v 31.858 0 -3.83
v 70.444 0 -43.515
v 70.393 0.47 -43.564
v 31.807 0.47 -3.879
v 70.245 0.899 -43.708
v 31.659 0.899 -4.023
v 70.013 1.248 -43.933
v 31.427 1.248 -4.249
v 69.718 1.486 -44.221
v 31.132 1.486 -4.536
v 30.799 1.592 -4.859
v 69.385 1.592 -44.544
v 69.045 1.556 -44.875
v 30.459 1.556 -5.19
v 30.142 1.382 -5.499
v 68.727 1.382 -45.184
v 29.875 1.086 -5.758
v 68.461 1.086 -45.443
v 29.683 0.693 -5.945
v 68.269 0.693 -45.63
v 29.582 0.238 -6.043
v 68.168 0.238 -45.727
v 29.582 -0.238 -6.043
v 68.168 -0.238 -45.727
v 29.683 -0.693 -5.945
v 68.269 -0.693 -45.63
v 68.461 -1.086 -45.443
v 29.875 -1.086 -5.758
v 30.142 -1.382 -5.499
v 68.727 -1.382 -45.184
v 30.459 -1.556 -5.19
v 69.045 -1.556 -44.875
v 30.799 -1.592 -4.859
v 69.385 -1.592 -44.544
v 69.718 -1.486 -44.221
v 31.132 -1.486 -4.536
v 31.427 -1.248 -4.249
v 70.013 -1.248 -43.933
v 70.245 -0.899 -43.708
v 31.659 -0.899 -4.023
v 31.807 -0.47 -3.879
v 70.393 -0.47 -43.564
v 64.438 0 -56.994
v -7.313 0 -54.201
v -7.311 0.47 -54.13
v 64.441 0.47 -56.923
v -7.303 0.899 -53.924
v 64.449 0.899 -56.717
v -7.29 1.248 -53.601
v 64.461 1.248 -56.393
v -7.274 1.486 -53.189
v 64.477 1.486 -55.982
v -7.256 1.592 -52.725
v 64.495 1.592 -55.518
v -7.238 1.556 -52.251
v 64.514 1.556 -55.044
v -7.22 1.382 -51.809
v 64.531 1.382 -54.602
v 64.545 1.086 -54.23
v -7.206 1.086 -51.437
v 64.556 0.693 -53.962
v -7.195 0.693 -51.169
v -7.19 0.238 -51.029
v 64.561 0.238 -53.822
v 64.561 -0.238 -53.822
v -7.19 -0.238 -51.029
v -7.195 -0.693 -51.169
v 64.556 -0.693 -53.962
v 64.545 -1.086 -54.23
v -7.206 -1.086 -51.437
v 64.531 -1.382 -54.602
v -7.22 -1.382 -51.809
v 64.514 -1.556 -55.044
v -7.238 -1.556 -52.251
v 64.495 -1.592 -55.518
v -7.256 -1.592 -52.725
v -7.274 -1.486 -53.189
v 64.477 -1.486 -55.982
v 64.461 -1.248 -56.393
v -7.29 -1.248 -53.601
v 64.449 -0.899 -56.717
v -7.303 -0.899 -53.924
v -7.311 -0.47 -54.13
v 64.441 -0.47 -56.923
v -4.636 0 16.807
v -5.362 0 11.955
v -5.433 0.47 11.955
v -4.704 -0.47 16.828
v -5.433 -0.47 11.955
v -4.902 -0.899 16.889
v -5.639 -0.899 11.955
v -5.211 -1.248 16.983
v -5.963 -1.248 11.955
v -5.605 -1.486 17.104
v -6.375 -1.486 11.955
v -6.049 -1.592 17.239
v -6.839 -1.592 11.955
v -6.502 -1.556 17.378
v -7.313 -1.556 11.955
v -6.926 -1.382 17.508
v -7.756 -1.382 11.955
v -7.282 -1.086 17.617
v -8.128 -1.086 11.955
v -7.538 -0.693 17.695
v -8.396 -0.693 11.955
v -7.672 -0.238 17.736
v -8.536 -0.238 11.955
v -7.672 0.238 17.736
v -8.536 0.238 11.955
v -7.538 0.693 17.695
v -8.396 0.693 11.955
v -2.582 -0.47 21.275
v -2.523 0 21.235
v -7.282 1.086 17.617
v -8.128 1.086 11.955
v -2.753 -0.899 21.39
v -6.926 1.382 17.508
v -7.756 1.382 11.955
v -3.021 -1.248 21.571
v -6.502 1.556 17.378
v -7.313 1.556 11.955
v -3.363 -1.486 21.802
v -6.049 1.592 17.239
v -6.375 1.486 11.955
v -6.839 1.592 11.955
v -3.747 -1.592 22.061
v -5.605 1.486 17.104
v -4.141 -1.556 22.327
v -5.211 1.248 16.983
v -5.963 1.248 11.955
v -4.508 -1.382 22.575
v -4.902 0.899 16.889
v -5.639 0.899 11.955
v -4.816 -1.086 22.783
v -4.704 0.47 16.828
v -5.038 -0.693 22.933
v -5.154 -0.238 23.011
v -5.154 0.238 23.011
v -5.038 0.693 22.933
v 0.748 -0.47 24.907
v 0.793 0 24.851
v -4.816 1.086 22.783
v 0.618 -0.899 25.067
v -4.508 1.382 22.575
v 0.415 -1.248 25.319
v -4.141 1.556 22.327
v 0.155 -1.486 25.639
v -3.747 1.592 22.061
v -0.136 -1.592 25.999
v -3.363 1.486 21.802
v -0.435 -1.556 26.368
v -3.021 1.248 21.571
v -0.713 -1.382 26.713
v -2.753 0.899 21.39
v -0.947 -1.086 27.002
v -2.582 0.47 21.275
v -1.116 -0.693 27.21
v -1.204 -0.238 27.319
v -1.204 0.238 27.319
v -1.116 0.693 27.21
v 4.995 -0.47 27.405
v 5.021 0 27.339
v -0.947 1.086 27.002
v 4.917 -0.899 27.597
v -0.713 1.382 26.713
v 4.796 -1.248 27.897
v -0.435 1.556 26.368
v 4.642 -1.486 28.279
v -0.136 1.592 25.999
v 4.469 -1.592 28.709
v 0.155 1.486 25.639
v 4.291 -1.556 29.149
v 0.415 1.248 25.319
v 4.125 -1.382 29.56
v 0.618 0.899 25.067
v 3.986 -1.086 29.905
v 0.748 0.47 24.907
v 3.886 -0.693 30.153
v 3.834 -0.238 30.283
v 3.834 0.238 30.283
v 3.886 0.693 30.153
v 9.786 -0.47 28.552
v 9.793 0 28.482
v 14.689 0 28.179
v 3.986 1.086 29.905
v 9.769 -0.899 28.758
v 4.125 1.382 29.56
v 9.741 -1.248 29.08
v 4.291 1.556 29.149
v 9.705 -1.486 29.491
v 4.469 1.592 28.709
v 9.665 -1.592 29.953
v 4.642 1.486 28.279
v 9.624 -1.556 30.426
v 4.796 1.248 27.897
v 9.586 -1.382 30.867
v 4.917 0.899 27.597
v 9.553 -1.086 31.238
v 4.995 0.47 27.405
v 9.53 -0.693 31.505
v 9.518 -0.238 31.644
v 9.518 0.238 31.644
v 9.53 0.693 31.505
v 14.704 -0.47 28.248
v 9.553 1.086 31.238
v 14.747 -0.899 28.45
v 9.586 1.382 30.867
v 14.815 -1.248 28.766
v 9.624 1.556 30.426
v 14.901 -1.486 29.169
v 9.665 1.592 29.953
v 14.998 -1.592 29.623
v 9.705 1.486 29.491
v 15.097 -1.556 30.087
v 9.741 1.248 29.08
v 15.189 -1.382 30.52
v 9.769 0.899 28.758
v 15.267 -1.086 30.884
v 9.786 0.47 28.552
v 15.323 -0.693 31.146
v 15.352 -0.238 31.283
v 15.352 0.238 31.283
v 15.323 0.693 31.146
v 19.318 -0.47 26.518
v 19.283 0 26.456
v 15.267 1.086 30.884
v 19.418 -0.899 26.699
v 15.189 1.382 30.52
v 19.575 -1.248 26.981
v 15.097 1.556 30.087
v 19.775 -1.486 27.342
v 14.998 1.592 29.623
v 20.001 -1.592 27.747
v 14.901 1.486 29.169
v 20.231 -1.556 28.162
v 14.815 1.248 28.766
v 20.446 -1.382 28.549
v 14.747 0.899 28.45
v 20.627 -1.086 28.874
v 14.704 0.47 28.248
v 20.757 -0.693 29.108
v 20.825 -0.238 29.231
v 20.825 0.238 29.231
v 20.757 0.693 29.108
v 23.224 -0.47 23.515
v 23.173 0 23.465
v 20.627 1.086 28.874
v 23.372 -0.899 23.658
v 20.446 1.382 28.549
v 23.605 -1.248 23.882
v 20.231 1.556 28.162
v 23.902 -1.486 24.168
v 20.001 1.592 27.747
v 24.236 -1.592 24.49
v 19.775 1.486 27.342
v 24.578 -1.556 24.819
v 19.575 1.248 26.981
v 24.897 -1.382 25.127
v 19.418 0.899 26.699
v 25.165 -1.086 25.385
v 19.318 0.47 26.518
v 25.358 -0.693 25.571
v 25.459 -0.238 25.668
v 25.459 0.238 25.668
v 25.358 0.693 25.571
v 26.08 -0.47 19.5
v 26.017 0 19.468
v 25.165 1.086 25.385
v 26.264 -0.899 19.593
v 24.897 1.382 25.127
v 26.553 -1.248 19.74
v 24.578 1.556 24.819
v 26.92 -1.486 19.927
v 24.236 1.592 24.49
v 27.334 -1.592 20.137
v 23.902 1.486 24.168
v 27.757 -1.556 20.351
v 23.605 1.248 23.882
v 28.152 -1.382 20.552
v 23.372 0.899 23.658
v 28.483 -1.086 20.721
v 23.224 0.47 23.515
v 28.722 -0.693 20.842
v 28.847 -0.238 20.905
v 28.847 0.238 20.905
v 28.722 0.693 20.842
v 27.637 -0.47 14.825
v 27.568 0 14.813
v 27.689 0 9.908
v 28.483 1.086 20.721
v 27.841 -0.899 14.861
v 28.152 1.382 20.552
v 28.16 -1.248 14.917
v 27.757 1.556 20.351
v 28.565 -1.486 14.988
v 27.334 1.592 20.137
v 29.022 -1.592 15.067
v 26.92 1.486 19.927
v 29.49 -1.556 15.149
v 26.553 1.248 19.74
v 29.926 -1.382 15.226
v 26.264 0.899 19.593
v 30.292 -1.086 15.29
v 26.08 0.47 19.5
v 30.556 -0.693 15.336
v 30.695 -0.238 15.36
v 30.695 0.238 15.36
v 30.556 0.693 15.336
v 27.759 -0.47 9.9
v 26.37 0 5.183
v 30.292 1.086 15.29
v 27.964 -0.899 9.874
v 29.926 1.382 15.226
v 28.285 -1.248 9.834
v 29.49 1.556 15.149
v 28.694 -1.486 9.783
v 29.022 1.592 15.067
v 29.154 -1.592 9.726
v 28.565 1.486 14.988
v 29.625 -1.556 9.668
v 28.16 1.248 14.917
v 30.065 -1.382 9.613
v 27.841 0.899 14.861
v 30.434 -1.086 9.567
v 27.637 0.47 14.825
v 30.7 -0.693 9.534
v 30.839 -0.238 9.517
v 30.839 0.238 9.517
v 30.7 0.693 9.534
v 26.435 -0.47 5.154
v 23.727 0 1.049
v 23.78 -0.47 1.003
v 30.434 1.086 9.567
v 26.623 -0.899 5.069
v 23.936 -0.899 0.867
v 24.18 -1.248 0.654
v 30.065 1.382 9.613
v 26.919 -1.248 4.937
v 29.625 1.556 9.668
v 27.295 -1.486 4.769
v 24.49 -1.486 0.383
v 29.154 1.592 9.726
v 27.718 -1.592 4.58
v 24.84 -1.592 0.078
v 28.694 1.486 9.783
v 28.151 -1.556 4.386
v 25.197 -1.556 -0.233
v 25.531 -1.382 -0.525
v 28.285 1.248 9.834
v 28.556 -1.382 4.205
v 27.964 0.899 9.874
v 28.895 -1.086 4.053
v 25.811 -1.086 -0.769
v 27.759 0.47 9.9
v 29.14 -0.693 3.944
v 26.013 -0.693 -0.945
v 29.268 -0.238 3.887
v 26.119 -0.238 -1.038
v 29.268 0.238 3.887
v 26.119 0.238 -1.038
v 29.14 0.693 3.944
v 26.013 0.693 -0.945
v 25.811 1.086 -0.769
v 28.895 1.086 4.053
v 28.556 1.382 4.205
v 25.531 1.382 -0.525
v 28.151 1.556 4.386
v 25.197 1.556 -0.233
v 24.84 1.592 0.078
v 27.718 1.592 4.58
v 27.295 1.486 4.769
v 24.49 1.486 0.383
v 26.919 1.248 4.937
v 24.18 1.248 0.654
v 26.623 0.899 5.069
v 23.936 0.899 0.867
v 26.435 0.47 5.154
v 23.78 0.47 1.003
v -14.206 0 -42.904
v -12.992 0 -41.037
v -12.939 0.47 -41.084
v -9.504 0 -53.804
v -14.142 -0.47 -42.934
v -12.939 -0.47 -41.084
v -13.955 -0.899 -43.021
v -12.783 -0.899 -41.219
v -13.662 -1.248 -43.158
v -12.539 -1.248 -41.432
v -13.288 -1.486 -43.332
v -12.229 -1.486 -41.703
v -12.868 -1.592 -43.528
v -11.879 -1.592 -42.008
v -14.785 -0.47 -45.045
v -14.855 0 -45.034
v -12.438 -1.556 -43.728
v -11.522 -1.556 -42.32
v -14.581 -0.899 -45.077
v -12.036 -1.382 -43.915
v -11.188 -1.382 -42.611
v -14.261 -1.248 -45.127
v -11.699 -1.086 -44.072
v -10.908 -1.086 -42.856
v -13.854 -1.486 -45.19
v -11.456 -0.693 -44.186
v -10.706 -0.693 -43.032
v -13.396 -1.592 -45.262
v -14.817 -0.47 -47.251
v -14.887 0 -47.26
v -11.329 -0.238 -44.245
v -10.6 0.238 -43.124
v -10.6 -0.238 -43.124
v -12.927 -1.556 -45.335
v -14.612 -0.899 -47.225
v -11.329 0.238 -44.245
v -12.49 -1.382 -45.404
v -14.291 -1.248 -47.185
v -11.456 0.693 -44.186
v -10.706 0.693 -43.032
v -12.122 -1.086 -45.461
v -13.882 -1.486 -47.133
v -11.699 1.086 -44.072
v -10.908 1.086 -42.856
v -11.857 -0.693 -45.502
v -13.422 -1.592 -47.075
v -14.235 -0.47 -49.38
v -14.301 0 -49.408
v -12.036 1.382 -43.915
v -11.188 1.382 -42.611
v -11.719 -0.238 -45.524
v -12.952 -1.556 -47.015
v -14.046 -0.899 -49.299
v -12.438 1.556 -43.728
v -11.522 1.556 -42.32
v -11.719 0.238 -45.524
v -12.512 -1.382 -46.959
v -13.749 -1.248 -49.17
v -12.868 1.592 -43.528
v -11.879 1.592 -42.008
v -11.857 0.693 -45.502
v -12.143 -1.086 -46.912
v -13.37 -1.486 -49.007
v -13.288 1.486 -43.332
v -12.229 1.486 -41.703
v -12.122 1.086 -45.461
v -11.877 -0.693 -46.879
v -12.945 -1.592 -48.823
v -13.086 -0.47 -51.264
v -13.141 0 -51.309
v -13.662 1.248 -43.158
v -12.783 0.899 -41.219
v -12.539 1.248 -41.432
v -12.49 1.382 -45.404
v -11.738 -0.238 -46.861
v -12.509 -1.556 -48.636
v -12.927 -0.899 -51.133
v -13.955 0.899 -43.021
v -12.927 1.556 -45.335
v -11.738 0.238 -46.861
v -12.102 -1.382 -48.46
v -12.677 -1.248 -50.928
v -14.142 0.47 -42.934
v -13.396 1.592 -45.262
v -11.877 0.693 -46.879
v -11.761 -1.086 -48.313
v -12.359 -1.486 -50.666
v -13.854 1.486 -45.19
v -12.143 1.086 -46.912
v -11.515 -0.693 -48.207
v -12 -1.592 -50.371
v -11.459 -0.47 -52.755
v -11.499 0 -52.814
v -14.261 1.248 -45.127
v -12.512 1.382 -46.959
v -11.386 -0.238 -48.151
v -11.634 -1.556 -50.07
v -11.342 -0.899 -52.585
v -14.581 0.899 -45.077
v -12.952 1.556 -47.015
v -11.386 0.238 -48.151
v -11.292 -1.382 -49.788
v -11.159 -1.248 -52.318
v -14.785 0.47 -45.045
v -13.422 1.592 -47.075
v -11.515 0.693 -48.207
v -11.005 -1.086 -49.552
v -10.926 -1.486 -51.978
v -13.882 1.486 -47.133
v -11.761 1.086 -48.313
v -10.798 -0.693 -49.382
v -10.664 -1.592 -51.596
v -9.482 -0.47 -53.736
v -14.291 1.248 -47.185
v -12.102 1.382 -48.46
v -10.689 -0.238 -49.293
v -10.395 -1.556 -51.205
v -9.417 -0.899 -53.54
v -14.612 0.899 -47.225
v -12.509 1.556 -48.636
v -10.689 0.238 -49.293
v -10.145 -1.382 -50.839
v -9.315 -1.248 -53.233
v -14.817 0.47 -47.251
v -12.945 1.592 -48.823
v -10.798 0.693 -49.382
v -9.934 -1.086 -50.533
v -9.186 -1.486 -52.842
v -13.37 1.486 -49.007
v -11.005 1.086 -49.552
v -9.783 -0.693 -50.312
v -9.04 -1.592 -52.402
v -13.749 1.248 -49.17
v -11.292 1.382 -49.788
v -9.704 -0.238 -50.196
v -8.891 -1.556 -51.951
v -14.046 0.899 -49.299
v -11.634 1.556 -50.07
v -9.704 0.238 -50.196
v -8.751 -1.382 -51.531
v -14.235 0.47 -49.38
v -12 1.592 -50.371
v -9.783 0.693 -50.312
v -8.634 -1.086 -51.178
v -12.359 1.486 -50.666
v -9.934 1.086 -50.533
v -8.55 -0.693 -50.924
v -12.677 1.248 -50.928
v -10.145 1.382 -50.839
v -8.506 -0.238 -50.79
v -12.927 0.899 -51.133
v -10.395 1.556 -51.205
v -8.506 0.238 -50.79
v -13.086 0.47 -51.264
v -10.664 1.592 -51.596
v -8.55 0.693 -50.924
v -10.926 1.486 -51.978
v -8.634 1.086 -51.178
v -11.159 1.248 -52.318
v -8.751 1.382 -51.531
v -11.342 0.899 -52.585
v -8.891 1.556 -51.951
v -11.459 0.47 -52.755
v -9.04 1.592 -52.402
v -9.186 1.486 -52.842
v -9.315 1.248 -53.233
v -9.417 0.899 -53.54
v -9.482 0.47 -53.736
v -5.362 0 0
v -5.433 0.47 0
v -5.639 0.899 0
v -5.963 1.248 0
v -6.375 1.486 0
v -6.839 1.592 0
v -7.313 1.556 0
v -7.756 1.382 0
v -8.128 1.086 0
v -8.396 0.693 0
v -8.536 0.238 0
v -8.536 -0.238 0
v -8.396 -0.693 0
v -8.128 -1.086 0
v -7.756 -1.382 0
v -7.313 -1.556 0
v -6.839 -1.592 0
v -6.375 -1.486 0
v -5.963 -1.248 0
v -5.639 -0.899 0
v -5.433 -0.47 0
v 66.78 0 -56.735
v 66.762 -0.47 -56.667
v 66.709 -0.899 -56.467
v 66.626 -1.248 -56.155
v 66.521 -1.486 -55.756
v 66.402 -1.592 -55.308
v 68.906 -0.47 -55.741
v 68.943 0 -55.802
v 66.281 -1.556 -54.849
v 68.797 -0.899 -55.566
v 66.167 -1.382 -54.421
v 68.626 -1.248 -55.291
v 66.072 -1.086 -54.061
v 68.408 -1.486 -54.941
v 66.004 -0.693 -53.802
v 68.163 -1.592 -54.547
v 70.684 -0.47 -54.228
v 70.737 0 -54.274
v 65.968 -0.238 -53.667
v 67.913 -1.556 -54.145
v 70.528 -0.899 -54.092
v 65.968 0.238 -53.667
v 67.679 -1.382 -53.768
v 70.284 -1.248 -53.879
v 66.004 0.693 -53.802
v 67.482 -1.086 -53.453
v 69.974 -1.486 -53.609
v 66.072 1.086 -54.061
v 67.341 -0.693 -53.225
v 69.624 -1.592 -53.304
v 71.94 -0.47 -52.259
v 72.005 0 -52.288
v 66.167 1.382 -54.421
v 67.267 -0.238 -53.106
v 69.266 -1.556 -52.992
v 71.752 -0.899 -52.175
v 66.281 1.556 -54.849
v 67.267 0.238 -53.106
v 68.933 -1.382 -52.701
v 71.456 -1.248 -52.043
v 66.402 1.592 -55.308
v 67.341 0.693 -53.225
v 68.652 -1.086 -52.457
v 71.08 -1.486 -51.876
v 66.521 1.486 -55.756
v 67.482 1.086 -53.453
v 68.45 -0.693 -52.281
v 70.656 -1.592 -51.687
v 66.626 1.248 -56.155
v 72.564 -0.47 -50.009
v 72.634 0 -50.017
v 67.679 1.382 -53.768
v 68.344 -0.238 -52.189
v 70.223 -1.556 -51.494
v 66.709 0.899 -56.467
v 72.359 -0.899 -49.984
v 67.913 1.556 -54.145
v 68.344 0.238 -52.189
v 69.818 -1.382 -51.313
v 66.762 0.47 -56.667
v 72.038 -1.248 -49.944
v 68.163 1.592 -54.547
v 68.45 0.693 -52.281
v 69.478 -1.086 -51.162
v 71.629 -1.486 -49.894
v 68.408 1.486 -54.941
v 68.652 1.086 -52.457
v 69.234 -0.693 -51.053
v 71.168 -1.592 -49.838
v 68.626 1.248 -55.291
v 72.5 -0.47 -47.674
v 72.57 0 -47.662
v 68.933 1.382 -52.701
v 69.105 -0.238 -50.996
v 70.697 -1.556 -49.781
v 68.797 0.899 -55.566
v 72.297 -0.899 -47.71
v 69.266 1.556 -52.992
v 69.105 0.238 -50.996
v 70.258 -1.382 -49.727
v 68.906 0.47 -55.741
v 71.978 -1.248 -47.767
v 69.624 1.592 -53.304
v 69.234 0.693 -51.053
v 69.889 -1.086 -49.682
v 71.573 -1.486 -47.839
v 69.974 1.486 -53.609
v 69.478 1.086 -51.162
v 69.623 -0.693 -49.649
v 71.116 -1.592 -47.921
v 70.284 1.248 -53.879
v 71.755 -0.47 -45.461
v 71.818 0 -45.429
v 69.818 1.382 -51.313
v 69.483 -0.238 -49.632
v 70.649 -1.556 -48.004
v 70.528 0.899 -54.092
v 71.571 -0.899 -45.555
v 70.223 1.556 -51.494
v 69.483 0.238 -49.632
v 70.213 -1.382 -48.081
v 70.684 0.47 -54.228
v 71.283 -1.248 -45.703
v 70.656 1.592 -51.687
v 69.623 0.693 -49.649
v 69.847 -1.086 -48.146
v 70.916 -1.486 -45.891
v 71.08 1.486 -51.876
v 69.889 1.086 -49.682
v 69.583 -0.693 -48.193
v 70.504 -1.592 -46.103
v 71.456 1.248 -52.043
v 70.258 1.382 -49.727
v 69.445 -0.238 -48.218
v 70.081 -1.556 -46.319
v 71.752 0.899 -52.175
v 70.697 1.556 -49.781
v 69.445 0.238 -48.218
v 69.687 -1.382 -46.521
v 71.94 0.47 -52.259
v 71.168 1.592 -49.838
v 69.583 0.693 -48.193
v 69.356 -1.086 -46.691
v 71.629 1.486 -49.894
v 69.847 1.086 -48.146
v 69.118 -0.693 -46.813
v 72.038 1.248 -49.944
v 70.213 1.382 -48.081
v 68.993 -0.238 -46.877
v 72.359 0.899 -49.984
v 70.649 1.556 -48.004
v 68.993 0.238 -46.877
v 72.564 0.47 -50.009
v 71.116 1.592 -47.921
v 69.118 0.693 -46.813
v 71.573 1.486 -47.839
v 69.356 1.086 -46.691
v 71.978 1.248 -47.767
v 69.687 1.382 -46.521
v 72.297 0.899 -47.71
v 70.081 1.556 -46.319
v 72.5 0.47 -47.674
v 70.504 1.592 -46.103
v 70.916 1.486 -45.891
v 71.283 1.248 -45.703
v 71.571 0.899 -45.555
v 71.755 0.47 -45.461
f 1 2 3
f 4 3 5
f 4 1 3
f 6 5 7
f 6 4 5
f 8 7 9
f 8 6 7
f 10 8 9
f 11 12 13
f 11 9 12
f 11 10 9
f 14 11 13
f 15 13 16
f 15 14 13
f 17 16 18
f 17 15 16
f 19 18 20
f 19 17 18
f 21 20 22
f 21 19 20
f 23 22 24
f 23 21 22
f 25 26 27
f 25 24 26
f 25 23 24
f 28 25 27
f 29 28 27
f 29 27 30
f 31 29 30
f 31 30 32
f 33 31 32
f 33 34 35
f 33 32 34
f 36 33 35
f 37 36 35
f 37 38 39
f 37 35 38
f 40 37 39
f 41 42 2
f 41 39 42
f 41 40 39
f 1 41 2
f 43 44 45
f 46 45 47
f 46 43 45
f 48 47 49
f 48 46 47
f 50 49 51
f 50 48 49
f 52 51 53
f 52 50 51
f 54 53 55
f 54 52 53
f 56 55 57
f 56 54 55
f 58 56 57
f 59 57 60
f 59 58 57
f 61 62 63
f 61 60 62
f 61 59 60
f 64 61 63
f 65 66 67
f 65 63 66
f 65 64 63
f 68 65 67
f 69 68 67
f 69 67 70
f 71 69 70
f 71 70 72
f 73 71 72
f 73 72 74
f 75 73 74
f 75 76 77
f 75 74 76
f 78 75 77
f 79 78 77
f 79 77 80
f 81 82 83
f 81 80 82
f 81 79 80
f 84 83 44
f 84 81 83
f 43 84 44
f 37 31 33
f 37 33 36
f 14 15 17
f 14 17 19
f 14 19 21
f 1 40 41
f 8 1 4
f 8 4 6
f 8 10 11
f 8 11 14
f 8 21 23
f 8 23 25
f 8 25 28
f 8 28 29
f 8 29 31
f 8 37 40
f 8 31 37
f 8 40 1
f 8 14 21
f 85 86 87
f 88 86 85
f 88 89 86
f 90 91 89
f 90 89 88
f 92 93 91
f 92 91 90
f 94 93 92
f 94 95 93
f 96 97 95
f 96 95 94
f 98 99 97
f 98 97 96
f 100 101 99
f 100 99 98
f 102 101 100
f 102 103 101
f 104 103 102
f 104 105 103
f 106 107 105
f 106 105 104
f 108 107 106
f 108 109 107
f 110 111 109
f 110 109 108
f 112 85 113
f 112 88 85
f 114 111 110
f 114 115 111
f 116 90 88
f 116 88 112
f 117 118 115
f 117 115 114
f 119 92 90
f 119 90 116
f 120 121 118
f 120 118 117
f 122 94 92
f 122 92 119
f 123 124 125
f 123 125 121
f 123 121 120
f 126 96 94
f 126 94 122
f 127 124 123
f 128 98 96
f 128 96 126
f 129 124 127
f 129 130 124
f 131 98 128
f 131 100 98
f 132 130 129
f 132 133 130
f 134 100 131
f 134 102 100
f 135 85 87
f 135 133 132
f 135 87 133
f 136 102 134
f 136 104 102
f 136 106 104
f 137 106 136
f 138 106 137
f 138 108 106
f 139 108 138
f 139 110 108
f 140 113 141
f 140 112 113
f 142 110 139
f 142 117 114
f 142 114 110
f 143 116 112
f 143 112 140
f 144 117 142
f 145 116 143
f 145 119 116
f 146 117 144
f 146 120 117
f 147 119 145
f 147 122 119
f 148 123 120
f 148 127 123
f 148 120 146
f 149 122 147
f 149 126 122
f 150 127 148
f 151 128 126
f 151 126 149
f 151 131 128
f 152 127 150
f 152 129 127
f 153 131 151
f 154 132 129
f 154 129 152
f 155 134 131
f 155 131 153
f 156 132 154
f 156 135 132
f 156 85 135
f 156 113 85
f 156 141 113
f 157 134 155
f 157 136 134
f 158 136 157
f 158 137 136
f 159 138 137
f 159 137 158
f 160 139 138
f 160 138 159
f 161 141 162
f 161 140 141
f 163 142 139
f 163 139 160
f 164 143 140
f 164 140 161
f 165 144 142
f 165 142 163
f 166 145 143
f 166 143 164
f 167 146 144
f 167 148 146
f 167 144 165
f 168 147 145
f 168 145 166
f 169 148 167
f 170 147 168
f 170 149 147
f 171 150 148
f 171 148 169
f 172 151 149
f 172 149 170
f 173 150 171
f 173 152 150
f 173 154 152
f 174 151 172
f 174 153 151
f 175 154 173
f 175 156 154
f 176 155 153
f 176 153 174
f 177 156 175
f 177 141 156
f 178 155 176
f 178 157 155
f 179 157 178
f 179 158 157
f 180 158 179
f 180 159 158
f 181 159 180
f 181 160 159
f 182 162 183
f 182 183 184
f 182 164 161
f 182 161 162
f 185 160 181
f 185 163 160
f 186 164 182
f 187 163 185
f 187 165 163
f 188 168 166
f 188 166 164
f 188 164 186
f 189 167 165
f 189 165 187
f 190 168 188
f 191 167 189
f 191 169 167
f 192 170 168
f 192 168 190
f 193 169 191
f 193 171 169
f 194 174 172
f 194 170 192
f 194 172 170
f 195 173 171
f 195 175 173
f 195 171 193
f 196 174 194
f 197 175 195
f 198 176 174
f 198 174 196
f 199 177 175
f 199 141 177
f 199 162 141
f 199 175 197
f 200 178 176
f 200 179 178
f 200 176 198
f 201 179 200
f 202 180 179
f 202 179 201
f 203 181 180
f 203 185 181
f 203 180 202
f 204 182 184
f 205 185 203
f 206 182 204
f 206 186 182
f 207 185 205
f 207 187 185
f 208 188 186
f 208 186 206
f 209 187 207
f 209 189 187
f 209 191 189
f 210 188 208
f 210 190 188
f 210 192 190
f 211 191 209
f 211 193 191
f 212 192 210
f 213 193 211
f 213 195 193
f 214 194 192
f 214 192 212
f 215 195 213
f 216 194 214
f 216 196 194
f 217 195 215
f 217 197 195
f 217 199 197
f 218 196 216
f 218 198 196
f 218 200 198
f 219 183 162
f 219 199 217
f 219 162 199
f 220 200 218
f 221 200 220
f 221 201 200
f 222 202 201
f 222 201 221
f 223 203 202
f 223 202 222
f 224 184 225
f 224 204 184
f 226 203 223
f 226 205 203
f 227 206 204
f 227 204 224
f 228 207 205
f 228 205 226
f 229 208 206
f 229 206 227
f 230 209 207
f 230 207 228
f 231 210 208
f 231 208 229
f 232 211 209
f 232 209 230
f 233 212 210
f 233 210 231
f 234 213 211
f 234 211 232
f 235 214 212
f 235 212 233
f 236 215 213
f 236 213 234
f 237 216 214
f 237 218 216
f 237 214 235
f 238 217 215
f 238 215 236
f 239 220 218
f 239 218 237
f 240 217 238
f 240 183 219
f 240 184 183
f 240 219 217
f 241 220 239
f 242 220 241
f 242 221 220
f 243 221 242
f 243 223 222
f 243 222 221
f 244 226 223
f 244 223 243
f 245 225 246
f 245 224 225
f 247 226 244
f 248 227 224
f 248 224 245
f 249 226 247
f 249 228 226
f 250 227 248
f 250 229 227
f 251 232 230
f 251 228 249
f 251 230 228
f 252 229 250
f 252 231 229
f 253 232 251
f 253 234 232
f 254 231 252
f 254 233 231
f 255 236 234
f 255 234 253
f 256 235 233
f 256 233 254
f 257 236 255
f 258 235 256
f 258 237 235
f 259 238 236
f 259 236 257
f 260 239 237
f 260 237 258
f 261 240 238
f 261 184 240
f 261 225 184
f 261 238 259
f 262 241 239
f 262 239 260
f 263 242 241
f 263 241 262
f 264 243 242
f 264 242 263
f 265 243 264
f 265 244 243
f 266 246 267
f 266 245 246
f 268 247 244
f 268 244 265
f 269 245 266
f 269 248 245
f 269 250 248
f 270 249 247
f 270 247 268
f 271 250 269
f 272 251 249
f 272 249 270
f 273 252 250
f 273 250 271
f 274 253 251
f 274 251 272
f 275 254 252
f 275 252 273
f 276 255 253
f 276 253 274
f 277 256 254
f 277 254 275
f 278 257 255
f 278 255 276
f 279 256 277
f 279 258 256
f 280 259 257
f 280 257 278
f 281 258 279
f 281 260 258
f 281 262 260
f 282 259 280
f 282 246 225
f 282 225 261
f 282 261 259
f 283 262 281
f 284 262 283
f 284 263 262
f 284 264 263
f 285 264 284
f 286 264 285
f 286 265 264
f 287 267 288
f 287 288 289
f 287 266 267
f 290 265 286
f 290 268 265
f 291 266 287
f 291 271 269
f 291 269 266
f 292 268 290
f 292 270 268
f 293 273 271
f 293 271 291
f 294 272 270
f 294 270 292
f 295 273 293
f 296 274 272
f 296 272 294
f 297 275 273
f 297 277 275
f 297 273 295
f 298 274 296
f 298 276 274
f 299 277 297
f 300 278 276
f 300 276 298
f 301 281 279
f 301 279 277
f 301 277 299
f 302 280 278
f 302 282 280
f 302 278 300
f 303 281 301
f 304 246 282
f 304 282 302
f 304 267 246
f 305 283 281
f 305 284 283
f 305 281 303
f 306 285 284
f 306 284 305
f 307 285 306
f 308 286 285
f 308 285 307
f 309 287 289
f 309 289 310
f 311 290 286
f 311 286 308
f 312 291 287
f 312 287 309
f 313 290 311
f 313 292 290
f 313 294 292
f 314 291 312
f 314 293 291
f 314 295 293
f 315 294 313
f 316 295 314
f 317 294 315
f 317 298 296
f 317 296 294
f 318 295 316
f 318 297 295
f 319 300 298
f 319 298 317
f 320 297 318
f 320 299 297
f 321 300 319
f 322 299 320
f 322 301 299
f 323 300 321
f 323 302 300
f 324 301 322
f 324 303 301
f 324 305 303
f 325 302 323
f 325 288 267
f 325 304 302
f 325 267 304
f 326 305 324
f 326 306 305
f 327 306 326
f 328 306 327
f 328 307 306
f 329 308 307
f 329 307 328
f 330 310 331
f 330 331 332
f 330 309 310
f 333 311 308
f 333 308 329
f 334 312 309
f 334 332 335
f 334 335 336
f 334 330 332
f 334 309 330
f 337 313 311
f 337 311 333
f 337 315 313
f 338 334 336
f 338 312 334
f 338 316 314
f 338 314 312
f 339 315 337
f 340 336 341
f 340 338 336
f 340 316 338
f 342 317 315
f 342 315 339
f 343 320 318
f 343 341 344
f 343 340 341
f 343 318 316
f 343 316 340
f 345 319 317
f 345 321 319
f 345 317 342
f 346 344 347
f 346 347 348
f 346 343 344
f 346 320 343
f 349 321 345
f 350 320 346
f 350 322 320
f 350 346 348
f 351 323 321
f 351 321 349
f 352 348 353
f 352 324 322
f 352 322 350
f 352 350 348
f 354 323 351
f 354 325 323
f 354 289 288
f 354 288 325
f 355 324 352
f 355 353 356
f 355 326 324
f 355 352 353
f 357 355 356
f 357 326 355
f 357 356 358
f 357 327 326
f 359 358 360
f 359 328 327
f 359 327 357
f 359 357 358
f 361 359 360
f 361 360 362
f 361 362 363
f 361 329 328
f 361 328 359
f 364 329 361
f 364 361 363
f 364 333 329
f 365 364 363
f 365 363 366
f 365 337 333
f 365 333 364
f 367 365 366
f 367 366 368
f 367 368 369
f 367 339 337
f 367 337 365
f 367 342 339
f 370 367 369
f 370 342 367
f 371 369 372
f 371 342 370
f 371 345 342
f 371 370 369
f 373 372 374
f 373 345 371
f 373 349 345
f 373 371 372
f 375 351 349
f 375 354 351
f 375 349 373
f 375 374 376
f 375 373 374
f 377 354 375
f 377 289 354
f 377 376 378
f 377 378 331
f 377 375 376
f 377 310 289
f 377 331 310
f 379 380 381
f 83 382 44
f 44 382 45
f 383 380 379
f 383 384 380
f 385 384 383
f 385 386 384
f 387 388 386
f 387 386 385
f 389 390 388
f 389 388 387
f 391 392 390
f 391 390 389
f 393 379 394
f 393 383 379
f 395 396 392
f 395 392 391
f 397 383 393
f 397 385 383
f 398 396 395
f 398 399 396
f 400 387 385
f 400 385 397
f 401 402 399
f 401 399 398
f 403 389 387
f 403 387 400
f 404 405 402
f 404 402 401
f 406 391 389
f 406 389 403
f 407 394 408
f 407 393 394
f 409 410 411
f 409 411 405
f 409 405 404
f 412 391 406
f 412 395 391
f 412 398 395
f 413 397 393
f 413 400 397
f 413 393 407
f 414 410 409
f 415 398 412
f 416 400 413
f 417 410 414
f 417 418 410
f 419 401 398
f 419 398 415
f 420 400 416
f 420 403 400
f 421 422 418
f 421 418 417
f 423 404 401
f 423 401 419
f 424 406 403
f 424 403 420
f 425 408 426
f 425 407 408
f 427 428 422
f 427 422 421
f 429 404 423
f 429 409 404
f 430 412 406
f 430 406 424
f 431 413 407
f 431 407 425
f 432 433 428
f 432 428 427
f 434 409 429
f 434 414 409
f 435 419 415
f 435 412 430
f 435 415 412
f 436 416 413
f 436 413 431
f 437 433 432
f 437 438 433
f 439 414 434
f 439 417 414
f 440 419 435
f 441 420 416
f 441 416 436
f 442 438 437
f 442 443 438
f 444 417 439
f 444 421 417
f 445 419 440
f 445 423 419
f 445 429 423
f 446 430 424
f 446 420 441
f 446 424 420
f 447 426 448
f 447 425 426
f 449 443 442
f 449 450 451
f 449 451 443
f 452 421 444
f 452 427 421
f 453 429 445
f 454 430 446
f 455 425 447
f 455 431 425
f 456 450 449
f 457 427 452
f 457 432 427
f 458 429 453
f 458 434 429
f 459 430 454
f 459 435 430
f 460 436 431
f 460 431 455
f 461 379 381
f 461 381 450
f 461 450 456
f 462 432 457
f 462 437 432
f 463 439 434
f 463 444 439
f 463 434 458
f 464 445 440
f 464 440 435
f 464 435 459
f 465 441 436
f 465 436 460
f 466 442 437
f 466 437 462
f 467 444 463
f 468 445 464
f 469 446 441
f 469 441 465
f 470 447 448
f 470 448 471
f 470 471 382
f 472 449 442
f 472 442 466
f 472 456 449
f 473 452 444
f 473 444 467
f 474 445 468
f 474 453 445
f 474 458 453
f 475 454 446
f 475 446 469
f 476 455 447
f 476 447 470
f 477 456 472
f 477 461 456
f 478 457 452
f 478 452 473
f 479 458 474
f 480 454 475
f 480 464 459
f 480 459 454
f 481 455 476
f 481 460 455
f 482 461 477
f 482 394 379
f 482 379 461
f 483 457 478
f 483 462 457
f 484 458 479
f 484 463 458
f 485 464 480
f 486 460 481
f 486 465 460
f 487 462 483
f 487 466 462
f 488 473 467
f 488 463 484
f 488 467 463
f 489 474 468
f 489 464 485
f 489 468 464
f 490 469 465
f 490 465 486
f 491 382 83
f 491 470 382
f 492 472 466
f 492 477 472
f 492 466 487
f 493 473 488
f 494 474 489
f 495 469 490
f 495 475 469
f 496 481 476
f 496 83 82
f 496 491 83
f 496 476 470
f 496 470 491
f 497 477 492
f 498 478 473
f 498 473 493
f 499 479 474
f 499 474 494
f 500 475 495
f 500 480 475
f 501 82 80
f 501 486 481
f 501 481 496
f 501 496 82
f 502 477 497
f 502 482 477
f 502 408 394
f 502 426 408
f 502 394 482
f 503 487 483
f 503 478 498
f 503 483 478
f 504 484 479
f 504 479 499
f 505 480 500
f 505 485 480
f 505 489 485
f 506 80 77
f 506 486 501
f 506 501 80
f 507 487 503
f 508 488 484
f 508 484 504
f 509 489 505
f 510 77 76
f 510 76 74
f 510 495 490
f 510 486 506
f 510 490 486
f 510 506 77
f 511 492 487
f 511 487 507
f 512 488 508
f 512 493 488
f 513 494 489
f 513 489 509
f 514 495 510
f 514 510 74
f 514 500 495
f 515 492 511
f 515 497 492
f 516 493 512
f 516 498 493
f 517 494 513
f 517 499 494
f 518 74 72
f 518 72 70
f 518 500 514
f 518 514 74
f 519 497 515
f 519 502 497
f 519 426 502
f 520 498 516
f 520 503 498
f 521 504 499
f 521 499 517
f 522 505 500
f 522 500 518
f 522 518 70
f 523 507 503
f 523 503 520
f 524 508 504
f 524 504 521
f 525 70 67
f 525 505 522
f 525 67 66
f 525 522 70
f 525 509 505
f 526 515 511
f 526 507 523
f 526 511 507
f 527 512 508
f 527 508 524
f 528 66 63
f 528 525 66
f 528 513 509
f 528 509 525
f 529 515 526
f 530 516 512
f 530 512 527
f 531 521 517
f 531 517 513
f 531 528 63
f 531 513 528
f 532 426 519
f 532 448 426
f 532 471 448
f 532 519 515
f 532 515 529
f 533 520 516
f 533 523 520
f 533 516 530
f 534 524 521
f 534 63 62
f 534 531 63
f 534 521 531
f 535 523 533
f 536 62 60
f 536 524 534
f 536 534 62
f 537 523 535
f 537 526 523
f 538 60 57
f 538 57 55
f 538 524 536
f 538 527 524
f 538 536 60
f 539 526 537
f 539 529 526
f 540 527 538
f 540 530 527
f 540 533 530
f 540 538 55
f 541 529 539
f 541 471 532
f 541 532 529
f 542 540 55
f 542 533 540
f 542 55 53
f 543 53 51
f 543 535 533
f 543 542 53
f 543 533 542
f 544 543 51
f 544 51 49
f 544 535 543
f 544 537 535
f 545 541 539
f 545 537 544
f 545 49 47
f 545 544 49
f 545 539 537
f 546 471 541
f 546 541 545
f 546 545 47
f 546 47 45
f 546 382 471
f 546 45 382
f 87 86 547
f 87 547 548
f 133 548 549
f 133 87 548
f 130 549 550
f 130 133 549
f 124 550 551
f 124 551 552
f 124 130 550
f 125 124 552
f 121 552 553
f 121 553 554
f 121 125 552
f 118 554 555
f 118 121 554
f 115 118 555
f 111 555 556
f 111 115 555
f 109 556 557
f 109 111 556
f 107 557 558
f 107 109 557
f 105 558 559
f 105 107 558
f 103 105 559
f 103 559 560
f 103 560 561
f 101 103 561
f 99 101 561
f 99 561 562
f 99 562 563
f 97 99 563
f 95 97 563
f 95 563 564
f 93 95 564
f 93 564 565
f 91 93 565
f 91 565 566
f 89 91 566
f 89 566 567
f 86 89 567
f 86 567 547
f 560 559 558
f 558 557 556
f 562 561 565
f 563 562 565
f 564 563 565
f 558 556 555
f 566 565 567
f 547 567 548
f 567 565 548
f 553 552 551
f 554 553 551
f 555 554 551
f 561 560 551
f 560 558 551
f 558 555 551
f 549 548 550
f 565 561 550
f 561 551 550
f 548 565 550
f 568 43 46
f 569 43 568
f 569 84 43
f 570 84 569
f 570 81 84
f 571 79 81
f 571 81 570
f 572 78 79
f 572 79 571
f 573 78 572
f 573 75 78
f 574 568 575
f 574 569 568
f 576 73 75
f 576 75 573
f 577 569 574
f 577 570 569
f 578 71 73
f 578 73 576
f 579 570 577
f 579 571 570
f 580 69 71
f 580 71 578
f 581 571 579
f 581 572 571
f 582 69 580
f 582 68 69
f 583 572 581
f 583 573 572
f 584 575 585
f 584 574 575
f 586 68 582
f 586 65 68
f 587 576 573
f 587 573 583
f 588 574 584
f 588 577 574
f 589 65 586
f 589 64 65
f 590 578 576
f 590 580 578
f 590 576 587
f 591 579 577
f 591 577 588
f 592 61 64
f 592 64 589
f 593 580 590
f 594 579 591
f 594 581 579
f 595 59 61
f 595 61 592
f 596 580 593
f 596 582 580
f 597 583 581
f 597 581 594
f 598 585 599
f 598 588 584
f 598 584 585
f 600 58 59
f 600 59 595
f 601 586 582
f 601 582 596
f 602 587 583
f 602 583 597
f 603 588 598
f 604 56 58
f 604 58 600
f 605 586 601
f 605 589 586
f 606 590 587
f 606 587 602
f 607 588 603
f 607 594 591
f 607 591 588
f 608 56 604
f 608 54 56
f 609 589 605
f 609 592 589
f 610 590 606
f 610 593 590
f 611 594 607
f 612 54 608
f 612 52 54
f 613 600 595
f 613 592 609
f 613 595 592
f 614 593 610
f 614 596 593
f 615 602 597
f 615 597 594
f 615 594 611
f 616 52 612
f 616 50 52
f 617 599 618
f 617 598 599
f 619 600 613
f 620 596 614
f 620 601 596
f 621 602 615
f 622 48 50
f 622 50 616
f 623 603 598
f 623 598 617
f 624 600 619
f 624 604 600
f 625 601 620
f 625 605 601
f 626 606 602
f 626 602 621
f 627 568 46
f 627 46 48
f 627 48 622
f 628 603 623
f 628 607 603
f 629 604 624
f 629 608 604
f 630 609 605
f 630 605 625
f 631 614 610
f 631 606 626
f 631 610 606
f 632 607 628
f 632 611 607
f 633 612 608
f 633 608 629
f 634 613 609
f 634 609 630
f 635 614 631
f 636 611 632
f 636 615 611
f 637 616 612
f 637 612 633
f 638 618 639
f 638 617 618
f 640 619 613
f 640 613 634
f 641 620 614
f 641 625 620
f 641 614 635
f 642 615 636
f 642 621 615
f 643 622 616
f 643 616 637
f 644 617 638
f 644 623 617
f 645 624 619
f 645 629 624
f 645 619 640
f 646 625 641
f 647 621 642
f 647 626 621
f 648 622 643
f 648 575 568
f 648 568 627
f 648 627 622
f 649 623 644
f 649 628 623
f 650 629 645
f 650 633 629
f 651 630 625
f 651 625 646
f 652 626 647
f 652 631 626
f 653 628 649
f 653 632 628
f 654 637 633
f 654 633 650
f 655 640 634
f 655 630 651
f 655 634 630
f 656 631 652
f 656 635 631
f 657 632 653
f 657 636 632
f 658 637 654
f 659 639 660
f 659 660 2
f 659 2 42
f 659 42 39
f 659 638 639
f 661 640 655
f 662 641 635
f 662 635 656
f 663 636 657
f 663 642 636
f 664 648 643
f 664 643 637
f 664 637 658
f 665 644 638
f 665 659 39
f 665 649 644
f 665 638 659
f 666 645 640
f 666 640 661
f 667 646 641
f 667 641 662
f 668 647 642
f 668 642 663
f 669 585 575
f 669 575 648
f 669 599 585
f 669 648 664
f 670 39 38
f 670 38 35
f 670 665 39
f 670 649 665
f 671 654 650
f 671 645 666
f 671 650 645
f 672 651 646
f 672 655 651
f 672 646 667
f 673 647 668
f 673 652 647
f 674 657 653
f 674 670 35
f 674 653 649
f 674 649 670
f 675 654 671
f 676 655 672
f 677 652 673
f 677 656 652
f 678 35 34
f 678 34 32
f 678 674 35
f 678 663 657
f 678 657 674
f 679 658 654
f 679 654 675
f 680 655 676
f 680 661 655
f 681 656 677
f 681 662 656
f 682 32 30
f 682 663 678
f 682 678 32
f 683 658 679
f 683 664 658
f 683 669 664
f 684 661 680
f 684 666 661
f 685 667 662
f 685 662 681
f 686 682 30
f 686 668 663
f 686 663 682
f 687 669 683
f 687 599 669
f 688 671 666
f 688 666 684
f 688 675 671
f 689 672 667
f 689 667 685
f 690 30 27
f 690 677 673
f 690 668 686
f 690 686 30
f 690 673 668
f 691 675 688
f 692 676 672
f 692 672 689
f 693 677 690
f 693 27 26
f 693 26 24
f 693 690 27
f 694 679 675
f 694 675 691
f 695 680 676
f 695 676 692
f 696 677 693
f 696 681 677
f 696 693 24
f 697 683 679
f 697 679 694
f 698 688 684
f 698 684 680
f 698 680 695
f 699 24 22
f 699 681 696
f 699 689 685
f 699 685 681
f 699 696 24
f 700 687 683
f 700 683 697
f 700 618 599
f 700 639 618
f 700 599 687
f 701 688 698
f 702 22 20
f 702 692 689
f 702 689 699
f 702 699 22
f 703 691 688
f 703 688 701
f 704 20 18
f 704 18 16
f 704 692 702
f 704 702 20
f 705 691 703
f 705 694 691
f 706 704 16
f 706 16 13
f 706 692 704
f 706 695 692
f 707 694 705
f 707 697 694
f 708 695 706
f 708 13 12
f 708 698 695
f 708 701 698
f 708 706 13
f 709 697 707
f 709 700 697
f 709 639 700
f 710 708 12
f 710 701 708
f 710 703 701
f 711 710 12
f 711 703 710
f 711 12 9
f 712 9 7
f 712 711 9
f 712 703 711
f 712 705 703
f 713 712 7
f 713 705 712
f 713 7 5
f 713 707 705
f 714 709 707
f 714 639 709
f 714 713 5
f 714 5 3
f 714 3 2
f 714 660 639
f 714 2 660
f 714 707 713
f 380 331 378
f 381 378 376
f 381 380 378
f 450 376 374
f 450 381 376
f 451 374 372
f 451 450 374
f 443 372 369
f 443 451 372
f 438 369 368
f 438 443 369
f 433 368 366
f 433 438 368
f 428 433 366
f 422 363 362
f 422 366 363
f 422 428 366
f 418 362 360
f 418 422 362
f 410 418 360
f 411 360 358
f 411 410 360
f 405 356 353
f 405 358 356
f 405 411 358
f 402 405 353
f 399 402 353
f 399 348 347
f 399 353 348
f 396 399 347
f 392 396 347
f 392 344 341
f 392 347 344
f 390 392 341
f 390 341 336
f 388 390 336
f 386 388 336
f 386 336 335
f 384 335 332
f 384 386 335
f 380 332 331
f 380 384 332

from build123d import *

# Parameters (mm, degrees)
F1_R = 1.5961106


with BuildPart() as f2:
    # F2: sweep along a path in F0
    with BuildLine(Plane.XZ) as f2_path:
        Line((-6.9580445253, 0), (-6.9580445253, 11.9551244375))
        ThreePointArc((-6.9580445253, 11.9551244375), (17.6107018393, 28.9826452432), (24.9295840919, 0))
        Line((24.9295840919, 0), (-11.7892465184, -42.0864411339))
        ThreePointArc((-11.7892465184, -42.0864411339), (-12.8350251699, -48.7762139122), (-7.2513464974, -52.6062589896))
        Line((-7.2513464974, -52.6062589896), (64.4998676804, -55.3990395556))
        ThreePointArc((64.4998676804, -55.3990395556), (70.54710566, -51.6383067584), (69.2995553841, -44.6271858307))
        Line((69.2995553841, -44.6271858307), (30.713789165, -4.9426425248))
    # F1 (on Top) → F2 (sweep)
    with BuildSketch(Plane.XY):
        with Locations((-6.9580445253, 0)):
            Circle(F1_R)
    sweep(path=f2_path.line)


solid = f2.part
